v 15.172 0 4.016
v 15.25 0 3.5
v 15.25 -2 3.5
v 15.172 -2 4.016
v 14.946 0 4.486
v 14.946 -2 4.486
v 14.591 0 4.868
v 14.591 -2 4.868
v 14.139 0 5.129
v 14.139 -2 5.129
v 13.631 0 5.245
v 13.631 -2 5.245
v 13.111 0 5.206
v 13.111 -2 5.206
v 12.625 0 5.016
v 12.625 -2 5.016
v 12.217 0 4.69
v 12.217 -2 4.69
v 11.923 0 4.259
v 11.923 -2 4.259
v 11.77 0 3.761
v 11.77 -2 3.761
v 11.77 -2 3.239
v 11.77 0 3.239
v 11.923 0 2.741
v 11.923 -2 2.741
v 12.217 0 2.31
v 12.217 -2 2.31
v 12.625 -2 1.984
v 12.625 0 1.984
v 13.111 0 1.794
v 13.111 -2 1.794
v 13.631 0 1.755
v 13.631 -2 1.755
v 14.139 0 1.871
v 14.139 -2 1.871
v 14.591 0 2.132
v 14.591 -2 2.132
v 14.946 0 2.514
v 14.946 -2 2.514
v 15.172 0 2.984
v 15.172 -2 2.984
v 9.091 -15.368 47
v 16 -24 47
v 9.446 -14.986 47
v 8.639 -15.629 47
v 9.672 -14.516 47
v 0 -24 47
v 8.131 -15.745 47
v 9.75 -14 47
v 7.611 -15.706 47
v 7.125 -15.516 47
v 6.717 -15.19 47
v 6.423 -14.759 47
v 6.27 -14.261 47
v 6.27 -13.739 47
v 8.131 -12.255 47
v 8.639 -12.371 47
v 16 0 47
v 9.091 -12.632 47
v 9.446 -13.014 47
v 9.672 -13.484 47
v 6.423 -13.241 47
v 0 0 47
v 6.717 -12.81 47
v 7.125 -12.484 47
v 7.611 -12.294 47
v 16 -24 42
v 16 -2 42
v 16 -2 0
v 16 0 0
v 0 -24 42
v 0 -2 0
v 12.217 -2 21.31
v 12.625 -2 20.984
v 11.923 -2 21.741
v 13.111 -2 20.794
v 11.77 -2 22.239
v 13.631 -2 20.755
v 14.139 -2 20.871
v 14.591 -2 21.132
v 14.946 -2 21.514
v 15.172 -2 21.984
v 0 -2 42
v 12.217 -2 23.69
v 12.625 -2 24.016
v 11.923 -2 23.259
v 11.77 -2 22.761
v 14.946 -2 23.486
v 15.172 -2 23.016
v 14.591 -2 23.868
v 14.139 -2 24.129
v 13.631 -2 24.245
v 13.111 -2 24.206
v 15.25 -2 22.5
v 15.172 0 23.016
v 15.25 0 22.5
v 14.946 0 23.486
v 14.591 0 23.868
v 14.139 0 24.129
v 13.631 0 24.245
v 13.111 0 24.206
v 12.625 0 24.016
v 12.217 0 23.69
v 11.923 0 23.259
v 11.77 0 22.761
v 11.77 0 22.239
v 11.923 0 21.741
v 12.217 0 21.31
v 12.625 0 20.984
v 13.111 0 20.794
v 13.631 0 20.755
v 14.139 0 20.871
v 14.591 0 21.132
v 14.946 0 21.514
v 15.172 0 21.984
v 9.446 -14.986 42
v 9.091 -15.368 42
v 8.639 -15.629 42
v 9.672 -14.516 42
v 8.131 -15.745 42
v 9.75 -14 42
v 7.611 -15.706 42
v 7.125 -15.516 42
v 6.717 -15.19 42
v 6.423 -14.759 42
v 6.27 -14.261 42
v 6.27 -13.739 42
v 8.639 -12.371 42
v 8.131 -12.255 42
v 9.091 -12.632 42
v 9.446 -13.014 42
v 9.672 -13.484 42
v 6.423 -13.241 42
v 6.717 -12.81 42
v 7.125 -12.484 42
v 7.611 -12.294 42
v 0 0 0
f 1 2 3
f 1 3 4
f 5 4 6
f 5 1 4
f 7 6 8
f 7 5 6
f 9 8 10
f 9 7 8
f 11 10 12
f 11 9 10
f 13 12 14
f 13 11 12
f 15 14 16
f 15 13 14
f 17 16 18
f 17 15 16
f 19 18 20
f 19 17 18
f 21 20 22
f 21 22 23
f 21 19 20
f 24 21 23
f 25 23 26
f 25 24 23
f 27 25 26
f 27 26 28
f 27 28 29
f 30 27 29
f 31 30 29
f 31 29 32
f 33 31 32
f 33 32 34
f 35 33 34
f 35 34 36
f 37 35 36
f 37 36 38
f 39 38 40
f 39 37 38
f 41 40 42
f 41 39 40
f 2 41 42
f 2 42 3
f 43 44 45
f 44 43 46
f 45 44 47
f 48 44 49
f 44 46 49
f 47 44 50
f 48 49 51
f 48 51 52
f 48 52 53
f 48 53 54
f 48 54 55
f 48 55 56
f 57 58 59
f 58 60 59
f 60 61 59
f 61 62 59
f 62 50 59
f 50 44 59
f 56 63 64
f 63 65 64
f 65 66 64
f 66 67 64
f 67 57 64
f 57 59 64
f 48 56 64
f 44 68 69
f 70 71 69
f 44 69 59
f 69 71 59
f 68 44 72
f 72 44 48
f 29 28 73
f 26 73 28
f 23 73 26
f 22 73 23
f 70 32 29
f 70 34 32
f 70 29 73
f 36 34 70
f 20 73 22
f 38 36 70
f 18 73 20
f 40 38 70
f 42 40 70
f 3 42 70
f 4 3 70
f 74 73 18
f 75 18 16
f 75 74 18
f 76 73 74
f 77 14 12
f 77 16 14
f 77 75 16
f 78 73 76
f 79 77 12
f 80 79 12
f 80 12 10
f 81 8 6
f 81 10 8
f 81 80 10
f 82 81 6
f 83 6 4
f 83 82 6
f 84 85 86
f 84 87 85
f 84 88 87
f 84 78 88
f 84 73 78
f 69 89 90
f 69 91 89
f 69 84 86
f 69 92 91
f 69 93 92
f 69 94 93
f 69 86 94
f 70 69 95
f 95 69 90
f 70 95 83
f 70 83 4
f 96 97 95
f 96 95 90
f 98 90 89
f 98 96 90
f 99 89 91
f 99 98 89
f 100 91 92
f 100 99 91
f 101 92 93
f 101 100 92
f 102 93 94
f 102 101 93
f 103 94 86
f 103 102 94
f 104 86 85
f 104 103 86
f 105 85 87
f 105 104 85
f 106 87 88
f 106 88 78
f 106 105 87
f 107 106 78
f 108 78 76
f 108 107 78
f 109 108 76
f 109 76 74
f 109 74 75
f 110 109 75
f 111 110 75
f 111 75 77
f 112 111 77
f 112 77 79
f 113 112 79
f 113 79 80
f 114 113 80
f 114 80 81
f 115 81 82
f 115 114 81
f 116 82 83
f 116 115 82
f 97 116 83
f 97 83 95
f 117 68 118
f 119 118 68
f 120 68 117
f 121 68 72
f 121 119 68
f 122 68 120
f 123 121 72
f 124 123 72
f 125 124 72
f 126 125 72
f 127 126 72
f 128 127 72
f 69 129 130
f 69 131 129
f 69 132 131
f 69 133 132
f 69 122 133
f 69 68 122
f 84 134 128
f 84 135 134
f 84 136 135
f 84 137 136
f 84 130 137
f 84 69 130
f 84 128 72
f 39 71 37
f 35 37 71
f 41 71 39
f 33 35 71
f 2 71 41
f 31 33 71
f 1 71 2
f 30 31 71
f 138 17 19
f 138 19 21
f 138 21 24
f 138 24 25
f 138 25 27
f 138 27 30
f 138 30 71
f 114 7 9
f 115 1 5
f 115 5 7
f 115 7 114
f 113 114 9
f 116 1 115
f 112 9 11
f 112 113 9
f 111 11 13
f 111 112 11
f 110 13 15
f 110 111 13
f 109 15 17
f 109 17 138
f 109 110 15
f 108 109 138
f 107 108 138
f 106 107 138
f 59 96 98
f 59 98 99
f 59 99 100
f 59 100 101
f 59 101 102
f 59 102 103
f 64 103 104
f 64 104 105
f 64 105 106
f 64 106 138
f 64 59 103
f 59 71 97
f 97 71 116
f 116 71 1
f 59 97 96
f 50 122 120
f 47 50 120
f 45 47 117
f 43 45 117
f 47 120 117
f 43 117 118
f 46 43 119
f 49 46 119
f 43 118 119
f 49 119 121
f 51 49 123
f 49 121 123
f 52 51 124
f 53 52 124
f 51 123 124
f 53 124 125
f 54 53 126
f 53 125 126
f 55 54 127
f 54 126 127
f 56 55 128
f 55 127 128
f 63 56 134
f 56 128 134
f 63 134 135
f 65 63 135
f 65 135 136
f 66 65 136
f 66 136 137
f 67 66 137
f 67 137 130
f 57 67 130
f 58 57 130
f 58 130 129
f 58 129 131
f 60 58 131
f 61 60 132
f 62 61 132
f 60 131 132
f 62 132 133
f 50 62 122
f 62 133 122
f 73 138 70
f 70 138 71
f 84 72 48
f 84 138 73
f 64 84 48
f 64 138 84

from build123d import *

# Parameters (mm, degrees)
F0_W     = 16
F0_H     = 42
F0_R     = 1.75
F1_DEPTH = 2
F2_W     = 16
F2_H     = 5
F3_DEPTH = 24
F4_R     = 1.75
F5_DEPTH = 5


with BuildPart() as f1:
    # F0 (on Front) → F1 (new body)
    with BuildSketch(Plane.XZ):
        with Locations((8, 21)):
            Rectangle(F0_W, F0_H)
        with Locations((13.5, 3.5)):
            Circle(F0_R, mode=Mode.SUBTRACT)
        with Locations((13.5, 22.5)):
            Circle(F0_R, mode=Mode.SUBTRACT)
    extrude(amount=F1_DEPTH)

    # F2 (on face) → F3 (join)
    with BuildSketch(Plane(origin=(0, 0, 0), x_dir=(-1, 0, 0), z_dir=(0, 1, 0))):
        with Locations((-8, 44.5)):
            Rectangle(F2_W, F2_H)
    extrude(amount=-F3_DEPTH)

    # F4 (on face) → F5 (cut, through all)
    with BuildSketch(Plane(origin=(0, 0, 42), x_dir=(1, 0, 0), z_dir=(0, 0, -1))):
        with Locations((8, 14)):
            Circle(F4_R)
    extrude(amount=-F5_DEPTH, mode=Mode.SUBTRACT)


solid = f1.part
